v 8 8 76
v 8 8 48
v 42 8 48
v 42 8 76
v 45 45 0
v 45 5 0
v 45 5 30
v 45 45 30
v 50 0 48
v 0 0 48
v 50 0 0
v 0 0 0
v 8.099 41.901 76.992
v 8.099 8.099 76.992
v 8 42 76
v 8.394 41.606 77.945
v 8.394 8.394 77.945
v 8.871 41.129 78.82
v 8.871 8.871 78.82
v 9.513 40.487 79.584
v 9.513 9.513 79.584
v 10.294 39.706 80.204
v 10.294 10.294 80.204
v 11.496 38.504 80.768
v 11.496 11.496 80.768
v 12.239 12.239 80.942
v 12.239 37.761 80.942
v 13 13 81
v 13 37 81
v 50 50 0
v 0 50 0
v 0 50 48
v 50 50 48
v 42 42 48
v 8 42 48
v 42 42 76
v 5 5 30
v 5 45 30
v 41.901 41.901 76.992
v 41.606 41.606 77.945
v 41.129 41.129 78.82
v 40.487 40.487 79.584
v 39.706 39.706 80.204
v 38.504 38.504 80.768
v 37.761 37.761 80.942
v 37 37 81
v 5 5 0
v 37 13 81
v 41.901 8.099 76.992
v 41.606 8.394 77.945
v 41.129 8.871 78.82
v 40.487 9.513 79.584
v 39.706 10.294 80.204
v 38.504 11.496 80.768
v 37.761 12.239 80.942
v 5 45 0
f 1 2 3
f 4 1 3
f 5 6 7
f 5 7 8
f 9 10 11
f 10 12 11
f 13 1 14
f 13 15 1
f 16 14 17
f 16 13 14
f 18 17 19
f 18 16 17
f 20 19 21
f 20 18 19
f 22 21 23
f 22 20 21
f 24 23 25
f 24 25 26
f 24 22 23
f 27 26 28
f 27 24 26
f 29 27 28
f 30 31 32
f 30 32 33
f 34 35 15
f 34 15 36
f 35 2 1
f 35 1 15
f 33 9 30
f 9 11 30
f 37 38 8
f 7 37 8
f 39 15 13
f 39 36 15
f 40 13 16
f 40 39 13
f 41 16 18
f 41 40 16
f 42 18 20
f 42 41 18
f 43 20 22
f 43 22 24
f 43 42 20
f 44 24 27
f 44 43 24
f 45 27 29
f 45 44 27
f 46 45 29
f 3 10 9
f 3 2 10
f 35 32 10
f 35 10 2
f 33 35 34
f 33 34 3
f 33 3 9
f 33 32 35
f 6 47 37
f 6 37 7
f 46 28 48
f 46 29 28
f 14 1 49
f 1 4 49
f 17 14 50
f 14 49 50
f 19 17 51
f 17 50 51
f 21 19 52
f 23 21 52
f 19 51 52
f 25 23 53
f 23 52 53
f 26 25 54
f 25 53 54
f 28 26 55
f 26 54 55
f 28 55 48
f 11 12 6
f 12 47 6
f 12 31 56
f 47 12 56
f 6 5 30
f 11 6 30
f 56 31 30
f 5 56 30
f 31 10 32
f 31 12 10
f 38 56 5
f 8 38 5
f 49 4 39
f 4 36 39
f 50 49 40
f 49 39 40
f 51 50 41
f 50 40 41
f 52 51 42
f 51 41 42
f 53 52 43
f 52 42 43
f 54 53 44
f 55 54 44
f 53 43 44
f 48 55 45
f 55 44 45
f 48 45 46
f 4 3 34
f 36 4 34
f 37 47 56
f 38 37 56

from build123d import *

# Parameters (mm, degrees)
F0_W     = 50
F0_H     = 50
F0_W_2   = 40
F0_H_2   = 40
F1_DEPTH = 30
F2_W     = 50
F2_H     = 50
F3_DEPTH = 18
F4_W     = 34
F4_H     = 34
F5_DEPTH = 33
F6_R     = 5


with BuildPart() as f1:
    # F0 (on Top) → F1 (new body)
    with BuildSketch(Plane.XY):
        with Locations((25, 25)):
            Rectangle(F0_W, F0_H)
        with Locations((25, 25)):
            Rectangle(F0_W_2, F0_H_2, mode=Mode.SUBTRACT)
    extrude(amount=F1_DEPTH)

    # F2 (on face) → F3 (join)
    with BuildSketch(Plane.XY.offset(30)):
        with Locations((25, 25)):
            Rectangle(F2_W, F2_H)
    extrude(amount=F3_DEPTH)

    # F4 (on face) → F5 (join)
    with BuildSketch(Plane.XY.offset(48)):
        with Locations((25, 25)):
            Rectangle(F4_W, F4_H)
    extrude(amount=F5_DEPTH)

    # F6
    f6_edges = [f1.edges().sort_by_distance(p)[0] for p in [
        (25, 8, 81),
        (8, 25, 81),
        (25, 42, 81),
        (42, 25, 81),
    ]]
    fillet(f6_edges, radius=F6_R)


solid = f1.part
